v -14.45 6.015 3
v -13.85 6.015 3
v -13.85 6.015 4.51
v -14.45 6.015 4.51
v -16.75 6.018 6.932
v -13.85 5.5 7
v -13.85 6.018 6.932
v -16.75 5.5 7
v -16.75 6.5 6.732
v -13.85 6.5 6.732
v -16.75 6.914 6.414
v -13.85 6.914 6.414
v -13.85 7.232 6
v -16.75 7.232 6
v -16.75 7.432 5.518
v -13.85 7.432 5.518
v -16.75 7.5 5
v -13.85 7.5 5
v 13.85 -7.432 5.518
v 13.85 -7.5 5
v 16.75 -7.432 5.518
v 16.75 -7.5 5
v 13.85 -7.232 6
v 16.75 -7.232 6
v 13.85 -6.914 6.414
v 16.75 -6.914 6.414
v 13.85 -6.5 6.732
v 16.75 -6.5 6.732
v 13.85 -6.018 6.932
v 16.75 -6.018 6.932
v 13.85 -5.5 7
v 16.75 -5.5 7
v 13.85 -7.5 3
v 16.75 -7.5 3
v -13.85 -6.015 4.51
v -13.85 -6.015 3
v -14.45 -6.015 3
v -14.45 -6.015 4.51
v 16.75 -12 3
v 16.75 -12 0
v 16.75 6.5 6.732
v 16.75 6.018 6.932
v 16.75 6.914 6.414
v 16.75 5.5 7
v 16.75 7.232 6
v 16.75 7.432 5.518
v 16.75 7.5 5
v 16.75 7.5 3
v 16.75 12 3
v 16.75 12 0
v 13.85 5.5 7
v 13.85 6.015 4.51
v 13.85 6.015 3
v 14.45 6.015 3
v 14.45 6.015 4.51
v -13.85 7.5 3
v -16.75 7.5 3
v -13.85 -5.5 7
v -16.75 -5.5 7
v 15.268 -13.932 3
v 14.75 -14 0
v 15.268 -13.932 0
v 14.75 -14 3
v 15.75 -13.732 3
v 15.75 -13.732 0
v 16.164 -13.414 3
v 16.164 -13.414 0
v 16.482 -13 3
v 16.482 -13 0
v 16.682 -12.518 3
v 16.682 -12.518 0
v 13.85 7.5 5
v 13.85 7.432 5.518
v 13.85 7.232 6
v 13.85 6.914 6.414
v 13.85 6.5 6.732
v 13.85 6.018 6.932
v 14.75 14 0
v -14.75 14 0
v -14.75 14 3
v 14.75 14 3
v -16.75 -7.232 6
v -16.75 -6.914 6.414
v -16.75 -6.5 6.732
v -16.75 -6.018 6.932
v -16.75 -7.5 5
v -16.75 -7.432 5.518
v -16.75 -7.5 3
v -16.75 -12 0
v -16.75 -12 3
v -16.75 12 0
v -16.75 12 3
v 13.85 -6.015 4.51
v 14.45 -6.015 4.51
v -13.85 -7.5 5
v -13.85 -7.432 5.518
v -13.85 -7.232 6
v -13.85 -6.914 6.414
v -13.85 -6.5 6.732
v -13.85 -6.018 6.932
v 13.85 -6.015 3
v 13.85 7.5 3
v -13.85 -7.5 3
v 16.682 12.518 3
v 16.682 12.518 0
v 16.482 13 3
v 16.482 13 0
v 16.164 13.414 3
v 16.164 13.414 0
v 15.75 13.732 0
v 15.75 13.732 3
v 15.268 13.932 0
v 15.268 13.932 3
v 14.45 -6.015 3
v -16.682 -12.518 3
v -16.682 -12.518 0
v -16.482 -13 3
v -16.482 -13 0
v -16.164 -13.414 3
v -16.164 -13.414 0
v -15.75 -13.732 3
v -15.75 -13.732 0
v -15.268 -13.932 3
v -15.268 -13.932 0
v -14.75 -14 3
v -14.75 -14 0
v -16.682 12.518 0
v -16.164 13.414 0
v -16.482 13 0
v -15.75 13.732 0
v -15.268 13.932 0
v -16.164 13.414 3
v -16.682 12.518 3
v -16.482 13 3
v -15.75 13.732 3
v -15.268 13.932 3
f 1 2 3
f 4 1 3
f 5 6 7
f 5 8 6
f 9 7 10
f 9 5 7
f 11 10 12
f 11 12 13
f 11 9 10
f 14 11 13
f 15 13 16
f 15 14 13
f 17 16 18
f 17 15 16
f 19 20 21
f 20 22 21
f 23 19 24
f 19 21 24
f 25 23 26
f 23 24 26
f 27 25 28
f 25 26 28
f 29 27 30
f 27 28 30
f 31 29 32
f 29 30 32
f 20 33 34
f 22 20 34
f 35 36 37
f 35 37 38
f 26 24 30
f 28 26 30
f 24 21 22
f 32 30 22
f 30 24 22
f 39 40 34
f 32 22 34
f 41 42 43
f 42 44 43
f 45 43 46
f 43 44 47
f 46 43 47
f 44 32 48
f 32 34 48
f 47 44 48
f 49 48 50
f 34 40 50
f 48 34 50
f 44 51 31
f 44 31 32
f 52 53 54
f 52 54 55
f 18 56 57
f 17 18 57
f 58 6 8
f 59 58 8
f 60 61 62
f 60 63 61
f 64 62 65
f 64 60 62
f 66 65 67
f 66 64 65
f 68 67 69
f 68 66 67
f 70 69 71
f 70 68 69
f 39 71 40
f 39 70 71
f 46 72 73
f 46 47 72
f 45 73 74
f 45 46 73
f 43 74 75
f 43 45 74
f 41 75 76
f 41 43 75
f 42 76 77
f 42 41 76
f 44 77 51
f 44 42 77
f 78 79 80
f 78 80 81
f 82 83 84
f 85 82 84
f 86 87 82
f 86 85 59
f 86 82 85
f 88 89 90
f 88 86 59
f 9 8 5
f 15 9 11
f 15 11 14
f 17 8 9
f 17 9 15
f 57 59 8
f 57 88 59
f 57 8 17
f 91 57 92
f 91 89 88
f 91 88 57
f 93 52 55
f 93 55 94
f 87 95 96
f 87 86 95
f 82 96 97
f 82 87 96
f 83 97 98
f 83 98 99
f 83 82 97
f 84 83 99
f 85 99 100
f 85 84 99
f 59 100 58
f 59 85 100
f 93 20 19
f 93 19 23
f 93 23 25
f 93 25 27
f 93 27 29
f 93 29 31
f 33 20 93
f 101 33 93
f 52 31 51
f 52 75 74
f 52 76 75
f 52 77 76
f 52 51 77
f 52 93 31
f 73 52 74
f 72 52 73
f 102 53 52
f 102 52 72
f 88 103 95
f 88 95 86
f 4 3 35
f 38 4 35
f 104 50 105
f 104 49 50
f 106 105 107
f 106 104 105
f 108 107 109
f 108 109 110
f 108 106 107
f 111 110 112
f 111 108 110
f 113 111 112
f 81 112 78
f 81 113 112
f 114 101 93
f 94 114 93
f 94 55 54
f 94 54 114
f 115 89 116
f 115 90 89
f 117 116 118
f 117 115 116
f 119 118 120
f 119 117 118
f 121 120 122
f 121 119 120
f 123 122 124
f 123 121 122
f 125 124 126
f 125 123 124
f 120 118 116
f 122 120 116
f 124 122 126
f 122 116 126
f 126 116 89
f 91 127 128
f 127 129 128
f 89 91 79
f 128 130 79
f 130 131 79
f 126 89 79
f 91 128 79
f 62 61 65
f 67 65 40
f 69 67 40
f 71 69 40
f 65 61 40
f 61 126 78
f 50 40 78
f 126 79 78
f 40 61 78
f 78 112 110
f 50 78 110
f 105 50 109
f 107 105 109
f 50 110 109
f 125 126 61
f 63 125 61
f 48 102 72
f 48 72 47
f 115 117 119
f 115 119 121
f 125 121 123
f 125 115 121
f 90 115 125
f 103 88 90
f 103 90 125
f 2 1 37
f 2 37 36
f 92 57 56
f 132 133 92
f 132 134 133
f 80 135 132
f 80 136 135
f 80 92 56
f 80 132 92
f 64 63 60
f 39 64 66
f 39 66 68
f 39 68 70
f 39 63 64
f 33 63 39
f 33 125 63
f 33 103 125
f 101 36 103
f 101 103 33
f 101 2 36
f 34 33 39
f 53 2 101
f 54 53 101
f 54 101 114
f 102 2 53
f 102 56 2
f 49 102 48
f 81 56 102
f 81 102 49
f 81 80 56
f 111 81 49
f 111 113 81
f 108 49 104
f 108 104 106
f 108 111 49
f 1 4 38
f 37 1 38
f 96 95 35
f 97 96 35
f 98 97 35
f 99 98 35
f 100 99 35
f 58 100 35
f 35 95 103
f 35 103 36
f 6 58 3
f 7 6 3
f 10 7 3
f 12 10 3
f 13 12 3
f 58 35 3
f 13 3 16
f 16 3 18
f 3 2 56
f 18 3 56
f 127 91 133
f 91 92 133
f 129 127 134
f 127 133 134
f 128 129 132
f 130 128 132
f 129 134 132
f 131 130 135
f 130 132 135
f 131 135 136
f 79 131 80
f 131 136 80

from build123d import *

# Parameters (mm, degrees)
F0_W     = 33.5
F0_H     = 28
F1_DEPTH = 3
F2_R     = 2
F3_W     = 2.9
F3_H     = 15
F4_DEPTH = 4
F5_W     = 12.03
F5_H     = 1.51
F6_DEPTH = 0.6
F7_R     = 2


# Not quite as in the source:
# - a pattern or mirror of a feature is missing from the dataset's text; its kind, count and spacing are read off the source's solid


with BuildPart() as f1:
    # F0 (on Top) → F1 (new body)
    with BuildSketch(Plane.XY):
        Rectangle(F0_W, F0_H)
    extrude(amount=F1_DEPTH)

    # F2
    f2_edges = [f1.edges().sort_by_distance(p)[0] for p in [
        (-16.75, -14, 1.5),
        (16.75, -14, 1.5),
        (16.75, 14, 1.5),
        (-16.75, 14, 1.5),
    ]]
    fillet(f2_edges, radius=F2_R)

    # F3 (on face) → F4 (join)
    with BuildSketch(Plane.XY.offset(3)):
        with Locations((15.3, 0)):
            Rectangle(F3_W, F3_H)
    f4 = extrude(amount=F4_DEPTH)

    # F4_copies: F4 across plane
    add(f4.mirror(Plane(origin=(0, 0, 0), x_dir=(0, 0, -1), z_dir=(-1, 0, 0))))

    # F5 (on face) → F6 (cut)
    with BuildSketch(Plane(origin=(13.85, 0, 0), x_dir=(0, -1, 0), z_dir=(-1, 0, 0))):
        with Locations((0, 3.755)):
            Rectangle(F5_W, F5_H)
    f6 = extrude(amount=-F6_DEPTH, mode=Mode.SUBTRACT)

    # F6_copies: F6 across plane
    add(f6.mirror(Plane(origin=(0, 0, 0), x_dir=(0, 0, -1), z_dir=(-1, 0, 0))), mode=Mode.SUBTRACT)

    # F7
    f7_edges = [f1.edges().sort_by_distance(p)[0] for p in [
        (15.3, 7.5, 7),
        (15.3, -7.5, 7),
        (-15.3, 7.5, 7),
        (-15.3, -7.5, 7),
    ]]
    fillet(f7_edges, radius=F7_R)


solid = f1.part
